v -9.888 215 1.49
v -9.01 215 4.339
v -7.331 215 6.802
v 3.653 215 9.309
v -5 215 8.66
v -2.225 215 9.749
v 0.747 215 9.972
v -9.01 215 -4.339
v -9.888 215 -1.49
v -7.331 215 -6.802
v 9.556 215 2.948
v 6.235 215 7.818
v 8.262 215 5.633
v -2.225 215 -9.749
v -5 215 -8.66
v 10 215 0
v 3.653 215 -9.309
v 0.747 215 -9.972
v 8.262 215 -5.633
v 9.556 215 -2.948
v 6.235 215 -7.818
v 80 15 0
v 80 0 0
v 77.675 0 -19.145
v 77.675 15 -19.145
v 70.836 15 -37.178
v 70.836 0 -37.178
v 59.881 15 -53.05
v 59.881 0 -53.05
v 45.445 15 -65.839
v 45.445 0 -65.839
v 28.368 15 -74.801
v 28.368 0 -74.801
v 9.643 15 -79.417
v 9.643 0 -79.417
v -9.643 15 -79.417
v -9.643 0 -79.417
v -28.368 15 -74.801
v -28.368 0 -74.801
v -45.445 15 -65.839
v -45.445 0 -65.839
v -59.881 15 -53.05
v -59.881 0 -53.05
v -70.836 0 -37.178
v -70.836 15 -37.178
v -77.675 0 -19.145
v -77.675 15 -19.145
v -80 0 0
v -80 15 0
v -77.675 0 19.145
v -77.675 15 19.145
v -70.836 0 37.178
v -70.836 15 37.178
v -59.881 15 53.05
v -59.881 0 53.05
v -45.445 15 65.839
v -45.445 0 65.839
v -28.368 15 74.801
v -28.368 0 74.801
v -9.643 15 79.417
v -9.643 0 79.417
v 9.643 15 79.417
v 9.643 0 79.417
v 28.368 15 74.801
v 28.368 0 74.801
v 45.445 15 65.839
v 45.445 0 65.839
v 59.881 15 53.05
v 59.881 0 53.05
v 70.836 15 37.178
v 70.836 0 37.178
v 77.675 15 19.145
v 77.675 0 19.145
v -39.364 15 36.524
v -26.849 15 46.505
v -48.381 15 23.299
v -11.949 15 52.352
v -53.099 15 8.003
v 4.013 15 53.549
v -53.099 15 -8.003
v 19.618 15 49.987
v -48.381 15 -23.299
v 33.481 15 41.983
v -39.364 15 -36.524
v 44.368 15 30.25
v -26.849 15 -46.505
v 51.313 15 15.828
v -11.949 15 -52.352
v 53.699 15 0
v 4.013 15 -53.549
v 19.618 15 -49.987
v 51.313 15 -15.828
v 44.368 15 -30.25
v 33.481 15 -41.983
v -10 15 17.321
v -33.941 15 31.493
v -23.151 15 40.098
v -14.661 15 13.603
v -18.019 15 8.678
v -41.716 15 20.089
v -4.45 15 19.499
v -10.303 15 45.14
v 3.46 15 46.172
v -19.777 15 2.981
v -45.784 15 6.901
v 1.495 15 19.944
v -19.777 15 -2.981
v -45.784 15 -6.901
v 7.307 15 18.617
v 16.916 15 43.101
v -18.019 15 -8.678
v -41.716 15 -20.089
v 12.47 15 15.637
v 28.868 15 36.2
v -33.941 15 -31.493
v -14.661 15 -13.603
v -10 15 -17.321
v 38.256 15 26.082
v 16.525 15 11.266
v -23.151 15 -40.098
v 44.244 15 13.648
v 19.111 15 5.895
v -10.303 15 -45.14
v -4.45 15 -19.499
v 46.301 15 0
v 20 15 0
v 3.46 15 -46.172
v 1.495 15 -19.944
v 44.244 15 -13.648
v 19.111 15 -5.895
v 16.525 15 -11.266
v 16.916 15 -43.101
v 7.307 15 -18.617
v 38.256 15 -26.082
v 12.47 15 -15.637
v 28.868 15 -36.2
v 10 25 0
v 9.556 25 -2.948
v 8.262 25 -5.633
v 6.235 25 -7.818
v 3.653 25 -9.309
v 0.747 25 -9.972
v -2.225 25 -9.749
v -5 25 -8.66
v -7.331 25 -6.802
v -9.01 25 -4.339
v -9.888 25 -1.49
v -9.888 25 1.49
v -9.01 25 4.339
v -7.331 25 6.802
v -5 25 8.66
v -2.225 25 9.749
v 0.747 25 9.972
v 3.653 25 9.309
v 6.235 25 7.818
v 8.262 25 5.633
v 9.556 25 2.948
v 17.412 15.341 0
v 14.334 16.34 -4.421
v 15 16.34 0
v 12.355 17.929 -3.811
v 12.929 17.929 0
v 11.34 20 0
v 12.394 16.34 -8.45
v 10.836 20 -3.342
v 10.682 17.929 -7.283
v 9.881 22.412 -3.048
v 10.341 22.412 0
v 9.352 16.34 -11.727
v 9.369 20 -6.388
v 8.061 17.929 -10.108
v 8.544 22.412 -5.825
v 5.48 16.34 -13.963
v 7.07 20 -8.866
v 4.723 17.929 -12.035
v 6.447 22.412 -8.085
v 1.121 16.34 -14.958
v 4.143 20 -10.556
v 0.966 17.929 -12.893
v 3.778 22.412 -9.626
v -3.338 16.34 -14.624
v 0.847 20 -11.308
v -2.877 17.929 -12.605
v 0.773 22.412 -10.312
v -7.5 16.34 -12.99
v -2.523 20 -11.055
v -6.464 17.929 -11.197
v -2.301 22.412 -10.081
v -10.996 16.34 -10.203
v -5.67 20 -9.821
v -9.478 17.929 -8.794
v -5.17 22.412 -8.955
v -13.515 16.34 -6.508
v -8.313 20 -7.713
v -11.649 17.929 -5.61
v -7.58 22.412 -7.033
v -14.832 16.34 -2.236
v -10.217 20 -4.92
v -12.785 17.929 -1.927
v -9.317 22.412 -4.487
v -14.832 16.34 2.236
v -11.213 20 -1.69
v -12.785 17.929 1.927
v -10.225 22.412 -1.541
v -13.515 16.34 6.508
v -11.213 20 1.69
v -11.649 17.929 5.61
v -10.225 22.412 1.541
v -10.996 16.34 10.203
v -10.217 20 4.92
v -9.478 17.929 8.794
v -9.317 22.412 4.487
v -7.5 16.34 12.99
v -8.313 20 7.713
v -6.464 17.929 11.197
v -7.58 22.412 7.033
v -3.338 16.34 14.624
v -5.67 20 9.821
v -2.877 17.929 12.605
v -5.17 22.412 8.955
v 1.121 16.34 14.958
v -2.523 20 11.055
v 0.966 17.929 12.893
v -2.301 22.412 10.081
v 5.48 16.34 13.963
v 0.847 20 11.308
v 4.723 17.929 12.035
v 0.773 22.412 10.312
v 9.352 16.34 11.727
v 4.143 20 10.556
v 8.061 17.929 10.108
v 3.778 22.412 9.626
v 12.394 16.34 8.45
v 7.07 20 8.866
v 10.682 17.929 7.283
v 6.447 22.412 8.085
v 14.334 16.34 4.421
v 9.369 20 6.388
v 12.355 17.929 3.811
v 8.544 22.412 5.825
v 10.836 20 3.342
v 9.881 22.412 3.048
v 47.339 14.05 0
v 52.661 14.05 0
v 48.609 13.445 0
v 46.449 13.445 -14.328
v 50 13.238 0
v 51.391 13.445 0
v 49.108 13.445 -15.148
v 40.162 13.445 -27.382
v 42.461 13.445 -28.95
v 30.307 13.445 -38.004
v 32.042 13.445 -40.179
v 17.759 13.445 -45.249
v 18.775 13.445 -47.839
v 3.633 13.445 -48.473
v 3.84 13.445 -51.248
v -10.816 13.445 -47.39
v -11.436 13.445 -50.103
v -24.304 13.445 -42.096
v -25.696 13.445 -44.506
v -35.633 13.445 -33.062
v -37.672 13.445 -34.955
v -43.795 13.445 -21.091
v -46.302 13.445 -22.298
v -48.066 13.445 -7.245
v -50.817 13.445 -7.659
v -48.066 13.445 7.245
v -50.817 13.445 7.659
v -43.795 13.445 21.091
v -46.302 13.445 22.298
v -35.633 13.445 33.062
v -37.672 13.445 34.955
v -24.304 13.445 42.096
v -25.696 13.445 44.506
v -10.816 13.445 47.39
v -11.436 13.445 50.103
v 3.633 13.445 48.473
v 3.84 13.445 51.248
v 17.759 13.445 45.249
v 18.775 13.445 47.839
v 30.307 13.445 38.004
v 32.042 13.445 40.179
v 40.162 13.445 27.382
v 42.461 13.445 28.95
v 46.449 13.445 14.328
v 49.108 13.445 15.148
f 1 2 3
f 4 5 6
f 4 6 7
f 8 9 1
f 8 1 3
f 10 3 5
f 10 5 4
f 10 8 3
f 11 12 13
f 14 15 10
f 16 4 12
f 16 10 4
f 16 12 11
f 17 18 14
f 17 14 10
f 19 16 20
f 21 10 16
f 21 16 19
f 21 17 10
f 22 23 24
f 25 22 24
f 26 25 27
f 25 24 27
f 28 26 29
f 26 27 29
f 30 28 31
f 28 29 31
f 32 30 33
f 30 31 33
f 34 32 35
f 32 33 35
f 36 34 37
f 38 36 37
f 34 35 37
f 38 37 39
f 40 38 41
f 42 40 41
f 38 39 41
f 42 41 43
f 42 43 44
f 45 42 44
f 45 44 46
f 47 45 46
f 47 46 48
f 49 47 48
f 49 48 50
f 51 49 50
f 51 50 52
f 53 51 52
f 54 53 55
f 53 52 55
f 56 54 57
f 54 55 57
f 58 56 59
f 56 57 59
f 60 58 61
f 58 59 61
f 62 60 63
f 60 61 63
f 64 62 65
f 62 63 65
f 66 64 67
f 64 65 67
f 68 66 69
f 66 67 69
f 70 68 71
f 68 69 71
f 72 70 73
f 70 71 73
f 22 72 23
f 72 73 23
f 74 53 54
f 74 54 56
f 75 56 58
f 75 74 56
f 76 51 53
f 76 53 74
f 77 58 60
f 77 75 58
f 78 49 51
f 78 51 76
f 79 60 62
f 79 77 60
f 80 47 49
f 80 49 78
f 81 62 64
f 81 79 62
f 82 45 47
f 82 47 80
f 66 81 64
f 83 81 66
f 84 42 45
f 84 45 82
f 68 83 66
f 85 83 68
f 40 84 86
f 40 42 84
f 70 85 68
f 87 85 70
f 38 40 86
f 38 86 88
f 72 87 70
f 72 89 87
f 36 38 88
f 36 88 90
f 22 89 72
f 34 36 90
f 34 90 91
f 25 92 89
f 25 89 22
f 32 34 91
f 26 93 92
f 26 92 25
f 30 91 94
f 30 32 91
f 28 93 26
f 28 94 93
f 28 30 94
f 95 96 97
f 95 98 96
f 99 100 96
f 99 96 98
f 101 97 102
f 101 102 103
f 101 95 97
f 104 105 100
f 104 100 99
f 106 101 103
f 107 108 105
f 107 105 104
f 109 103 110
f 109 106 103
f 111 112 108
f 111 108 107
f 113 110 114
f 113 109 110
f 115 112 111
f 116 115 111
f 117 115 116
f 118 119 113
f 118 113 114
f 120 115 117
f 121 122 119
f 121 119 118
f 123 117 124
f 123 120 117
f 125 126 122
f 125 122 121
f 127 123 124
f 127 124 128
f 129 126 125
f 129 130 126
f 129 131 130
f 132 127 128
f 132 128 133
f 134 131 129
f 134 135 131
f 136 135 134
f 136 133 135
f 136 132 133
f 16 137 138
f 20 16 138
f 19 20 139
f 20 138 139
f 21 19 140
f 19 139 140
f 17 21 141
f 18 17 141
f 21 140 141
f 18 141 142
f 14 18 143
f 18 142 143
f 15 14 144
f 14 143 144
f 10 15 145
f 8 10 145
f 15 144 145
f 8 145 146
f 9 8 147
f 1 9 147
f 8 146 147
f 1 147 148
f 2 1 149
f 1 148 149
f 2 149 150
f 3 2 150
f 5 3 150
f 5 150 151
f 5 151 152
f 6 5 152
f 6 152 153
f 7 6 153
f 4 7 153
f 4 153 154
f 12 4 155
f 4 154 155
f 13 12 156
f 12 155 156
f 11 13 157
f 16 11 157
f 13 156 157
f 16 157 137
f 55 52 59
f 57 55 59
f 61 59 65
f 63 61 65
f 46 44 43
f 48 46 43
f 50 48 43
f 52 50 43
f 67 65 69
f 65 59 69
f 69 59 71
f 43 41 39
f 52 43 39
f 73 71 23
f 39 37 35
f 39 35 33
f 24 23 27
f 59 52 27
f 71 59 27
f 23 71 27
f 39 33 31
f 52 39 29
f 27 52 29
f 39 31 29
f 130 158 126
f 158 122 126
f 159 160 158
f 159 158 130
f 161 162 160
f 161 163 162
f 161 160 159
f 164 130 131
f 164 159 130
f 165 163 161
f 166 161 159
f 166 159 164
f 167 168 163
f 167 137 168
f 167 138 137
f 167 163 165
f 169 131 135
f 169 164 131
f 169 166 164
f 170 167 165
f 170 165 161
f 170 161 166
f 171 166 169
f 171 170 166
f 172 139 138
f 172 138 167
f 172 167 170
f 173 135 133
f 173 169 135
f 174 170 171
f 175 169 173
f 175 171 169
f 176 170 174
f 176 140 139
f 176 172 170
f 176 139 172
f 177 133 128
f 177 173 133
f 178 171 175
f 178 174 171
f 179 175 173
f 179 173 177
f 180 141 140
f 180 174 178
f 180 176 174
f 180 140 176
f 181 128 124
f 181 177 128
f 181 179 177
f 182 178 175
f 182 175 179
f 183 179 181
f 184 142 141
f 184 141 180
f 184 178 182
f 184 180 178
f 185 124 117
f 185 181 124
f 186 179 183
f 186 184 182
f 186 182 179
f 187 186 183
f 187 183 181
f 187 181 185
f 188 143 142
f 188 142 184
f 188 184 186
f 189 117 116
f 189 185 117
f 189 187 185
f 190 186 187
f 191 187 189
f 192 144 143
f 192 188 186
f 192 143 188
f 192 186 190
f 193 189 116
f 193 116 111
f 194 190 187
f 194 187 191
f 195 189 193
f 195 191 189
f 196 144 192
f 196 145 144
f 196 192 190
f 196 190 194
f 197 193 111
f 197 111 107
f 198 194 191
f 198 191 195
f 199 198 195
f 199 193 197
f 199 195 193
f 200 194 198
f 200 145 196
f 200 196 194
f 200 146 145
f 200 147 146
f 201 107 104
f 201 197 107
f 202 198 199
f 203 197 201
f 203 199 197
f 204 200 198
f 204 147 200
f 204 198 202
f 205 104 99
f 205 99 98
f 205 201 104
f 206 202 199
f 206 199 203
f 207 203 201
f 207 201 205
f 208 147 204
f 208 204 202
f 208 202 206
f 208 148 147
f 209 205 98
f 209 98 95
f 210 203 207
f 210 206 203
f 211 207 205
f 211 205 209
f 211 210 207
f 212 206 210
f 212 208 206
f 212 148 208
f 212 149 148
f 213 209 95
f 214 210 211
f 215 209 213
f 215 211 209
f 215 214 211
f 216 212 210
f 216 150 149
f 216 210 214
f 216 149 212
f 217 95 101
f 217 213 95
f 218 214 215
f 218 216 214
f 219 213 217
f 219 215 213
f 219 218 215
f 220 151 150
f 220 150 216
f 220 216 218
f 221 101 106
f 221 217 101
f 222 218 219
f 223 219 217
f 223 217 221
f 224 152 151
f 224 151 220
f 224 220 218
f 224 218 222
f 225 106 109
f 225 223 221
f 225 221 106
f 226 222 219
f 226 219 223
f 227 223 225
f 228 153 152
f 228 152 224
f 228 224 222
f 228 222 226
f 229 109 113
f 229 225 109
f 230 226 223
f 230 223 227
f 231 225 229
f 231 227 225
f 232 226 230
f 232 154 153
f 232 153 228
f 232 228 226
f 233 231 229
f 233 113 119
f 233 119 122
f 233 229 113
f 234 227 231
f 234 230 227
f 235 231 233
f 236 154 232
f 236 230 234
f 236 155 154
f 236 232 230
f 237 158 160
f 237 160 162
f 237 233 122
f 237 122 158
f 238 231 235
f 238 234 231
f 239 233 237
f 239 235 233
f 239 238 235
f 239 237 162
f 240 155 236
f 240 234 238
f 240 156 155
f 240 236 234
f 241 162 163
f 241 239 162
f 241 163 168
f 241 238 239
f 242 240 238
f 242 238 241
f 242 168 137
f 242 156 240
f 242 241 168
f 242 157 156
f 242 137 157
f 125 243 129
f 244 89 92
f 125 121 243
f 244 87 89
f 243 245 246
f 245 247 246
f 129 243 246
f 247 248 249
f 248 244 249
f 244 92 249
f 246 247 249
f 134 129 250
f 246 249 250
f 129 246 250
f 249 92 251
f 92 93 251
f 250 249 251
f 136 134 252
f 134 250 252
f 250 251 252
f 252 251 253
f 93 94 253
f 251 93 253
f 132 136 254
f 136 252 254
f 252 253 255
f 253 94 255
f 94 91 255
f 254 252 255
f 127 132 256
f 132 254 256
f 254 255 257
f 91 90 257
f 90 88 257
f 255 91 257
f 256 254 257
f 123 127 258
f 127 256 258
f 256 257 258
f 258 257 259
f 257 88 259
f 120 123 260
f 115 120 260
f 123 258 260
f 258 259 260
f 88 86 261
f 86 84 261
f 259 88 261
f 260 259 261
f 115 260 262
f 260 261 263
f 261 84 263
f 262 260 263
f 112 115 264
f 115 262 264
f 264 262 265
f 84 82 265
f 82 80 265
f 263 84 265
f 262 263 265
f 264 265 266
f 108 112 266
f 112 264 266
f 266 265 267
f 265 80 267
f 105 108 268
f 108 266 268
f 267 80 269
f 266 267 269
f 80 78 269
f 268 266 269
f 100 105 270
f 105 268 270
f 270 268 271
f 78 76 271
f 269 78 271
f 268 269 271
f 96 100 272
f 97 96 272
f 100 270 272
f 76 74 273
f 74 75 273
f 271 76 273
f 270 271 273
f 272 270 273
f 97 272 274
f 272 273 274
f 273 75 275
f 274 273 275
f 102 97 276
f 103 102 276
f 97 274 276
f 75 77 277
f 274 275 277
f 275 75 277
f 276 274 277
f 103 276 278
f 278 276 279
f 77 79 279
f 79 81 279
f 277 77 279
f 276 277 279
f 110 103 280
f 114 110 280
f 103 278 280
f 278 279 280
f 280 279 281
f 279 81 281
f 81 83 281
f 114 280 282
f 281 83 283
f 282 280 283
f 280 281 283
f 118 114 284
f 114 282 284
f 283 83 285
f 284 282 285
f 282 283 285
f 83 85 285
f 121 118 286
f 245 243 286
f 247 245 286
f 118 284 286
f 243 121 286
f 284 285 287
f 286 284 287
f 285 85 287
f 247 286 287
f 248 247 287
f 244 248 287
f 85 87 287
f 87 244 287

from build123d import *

# Parameters (mm, degrees)
SKETCH1_R            = 80
BOSS_EXTRUDE1_DEPTH  = 15
SKETCH16_R           = 10
BOSS_EXTRUDE2_DEPTH  = 200
FILLET1_R            = 10
CUT_SWEEP2_PROFILE_R = 4.7625


with BuildPart() as part:
    # Sketch1 → Boss-Extrude1 (new body)
    with BuildSketch(Plane(origin=(0, 0, 0), x_dir=(1, 0, 0), z_dir=(0, 1, 0))):
        Circle(SKETCH1_R)
    extrude(amount=BOSS_EXTRUDE1_DEPTH)

    # Sketch16 → Boss-Extrude2 (add)
    with BuildSketch(Plane(origin=(0, 15, 0), x_dir=(1, 0, 0), z_dir=(0, 1, 0))):
        Circle(SKETCH16_R)
    extrude(amount=BOSS_EXTRUDE2_DEPTH)

    # Fillet1
    fillet1_edges = [part.edges().sort_by_distance(p)[0] for p in [
        (-10, 15, 0),
    ]]
    fillet(fillet1_edges, radius=FILLET1_R)

    # Cut-Sweep2: sweep along a path in Sketch29
    with BuildLine(Plane(origin=(0, 18, 0), x_dir=(1, 0, 0), z_dir=(0, 1, 0))) as cut_sweep2_path:
        CenterArc((0, 0), 50, 0, 360)
    # Cut-Sweep2 profile (on start of the path) → Cut-Sweep2 (sweep, cut)
    with BuildSketch(Plane(origin=(50, 18, 0), x_dir=(-1, 0, 0), z_dir=(0, 0, -1))):
        Circle(CUT_SWEEP2_PROFILE_R)
    sweep(path=cut_sweep2_path.line, mode=Mode.SUBTRACT)


solid = part.part
